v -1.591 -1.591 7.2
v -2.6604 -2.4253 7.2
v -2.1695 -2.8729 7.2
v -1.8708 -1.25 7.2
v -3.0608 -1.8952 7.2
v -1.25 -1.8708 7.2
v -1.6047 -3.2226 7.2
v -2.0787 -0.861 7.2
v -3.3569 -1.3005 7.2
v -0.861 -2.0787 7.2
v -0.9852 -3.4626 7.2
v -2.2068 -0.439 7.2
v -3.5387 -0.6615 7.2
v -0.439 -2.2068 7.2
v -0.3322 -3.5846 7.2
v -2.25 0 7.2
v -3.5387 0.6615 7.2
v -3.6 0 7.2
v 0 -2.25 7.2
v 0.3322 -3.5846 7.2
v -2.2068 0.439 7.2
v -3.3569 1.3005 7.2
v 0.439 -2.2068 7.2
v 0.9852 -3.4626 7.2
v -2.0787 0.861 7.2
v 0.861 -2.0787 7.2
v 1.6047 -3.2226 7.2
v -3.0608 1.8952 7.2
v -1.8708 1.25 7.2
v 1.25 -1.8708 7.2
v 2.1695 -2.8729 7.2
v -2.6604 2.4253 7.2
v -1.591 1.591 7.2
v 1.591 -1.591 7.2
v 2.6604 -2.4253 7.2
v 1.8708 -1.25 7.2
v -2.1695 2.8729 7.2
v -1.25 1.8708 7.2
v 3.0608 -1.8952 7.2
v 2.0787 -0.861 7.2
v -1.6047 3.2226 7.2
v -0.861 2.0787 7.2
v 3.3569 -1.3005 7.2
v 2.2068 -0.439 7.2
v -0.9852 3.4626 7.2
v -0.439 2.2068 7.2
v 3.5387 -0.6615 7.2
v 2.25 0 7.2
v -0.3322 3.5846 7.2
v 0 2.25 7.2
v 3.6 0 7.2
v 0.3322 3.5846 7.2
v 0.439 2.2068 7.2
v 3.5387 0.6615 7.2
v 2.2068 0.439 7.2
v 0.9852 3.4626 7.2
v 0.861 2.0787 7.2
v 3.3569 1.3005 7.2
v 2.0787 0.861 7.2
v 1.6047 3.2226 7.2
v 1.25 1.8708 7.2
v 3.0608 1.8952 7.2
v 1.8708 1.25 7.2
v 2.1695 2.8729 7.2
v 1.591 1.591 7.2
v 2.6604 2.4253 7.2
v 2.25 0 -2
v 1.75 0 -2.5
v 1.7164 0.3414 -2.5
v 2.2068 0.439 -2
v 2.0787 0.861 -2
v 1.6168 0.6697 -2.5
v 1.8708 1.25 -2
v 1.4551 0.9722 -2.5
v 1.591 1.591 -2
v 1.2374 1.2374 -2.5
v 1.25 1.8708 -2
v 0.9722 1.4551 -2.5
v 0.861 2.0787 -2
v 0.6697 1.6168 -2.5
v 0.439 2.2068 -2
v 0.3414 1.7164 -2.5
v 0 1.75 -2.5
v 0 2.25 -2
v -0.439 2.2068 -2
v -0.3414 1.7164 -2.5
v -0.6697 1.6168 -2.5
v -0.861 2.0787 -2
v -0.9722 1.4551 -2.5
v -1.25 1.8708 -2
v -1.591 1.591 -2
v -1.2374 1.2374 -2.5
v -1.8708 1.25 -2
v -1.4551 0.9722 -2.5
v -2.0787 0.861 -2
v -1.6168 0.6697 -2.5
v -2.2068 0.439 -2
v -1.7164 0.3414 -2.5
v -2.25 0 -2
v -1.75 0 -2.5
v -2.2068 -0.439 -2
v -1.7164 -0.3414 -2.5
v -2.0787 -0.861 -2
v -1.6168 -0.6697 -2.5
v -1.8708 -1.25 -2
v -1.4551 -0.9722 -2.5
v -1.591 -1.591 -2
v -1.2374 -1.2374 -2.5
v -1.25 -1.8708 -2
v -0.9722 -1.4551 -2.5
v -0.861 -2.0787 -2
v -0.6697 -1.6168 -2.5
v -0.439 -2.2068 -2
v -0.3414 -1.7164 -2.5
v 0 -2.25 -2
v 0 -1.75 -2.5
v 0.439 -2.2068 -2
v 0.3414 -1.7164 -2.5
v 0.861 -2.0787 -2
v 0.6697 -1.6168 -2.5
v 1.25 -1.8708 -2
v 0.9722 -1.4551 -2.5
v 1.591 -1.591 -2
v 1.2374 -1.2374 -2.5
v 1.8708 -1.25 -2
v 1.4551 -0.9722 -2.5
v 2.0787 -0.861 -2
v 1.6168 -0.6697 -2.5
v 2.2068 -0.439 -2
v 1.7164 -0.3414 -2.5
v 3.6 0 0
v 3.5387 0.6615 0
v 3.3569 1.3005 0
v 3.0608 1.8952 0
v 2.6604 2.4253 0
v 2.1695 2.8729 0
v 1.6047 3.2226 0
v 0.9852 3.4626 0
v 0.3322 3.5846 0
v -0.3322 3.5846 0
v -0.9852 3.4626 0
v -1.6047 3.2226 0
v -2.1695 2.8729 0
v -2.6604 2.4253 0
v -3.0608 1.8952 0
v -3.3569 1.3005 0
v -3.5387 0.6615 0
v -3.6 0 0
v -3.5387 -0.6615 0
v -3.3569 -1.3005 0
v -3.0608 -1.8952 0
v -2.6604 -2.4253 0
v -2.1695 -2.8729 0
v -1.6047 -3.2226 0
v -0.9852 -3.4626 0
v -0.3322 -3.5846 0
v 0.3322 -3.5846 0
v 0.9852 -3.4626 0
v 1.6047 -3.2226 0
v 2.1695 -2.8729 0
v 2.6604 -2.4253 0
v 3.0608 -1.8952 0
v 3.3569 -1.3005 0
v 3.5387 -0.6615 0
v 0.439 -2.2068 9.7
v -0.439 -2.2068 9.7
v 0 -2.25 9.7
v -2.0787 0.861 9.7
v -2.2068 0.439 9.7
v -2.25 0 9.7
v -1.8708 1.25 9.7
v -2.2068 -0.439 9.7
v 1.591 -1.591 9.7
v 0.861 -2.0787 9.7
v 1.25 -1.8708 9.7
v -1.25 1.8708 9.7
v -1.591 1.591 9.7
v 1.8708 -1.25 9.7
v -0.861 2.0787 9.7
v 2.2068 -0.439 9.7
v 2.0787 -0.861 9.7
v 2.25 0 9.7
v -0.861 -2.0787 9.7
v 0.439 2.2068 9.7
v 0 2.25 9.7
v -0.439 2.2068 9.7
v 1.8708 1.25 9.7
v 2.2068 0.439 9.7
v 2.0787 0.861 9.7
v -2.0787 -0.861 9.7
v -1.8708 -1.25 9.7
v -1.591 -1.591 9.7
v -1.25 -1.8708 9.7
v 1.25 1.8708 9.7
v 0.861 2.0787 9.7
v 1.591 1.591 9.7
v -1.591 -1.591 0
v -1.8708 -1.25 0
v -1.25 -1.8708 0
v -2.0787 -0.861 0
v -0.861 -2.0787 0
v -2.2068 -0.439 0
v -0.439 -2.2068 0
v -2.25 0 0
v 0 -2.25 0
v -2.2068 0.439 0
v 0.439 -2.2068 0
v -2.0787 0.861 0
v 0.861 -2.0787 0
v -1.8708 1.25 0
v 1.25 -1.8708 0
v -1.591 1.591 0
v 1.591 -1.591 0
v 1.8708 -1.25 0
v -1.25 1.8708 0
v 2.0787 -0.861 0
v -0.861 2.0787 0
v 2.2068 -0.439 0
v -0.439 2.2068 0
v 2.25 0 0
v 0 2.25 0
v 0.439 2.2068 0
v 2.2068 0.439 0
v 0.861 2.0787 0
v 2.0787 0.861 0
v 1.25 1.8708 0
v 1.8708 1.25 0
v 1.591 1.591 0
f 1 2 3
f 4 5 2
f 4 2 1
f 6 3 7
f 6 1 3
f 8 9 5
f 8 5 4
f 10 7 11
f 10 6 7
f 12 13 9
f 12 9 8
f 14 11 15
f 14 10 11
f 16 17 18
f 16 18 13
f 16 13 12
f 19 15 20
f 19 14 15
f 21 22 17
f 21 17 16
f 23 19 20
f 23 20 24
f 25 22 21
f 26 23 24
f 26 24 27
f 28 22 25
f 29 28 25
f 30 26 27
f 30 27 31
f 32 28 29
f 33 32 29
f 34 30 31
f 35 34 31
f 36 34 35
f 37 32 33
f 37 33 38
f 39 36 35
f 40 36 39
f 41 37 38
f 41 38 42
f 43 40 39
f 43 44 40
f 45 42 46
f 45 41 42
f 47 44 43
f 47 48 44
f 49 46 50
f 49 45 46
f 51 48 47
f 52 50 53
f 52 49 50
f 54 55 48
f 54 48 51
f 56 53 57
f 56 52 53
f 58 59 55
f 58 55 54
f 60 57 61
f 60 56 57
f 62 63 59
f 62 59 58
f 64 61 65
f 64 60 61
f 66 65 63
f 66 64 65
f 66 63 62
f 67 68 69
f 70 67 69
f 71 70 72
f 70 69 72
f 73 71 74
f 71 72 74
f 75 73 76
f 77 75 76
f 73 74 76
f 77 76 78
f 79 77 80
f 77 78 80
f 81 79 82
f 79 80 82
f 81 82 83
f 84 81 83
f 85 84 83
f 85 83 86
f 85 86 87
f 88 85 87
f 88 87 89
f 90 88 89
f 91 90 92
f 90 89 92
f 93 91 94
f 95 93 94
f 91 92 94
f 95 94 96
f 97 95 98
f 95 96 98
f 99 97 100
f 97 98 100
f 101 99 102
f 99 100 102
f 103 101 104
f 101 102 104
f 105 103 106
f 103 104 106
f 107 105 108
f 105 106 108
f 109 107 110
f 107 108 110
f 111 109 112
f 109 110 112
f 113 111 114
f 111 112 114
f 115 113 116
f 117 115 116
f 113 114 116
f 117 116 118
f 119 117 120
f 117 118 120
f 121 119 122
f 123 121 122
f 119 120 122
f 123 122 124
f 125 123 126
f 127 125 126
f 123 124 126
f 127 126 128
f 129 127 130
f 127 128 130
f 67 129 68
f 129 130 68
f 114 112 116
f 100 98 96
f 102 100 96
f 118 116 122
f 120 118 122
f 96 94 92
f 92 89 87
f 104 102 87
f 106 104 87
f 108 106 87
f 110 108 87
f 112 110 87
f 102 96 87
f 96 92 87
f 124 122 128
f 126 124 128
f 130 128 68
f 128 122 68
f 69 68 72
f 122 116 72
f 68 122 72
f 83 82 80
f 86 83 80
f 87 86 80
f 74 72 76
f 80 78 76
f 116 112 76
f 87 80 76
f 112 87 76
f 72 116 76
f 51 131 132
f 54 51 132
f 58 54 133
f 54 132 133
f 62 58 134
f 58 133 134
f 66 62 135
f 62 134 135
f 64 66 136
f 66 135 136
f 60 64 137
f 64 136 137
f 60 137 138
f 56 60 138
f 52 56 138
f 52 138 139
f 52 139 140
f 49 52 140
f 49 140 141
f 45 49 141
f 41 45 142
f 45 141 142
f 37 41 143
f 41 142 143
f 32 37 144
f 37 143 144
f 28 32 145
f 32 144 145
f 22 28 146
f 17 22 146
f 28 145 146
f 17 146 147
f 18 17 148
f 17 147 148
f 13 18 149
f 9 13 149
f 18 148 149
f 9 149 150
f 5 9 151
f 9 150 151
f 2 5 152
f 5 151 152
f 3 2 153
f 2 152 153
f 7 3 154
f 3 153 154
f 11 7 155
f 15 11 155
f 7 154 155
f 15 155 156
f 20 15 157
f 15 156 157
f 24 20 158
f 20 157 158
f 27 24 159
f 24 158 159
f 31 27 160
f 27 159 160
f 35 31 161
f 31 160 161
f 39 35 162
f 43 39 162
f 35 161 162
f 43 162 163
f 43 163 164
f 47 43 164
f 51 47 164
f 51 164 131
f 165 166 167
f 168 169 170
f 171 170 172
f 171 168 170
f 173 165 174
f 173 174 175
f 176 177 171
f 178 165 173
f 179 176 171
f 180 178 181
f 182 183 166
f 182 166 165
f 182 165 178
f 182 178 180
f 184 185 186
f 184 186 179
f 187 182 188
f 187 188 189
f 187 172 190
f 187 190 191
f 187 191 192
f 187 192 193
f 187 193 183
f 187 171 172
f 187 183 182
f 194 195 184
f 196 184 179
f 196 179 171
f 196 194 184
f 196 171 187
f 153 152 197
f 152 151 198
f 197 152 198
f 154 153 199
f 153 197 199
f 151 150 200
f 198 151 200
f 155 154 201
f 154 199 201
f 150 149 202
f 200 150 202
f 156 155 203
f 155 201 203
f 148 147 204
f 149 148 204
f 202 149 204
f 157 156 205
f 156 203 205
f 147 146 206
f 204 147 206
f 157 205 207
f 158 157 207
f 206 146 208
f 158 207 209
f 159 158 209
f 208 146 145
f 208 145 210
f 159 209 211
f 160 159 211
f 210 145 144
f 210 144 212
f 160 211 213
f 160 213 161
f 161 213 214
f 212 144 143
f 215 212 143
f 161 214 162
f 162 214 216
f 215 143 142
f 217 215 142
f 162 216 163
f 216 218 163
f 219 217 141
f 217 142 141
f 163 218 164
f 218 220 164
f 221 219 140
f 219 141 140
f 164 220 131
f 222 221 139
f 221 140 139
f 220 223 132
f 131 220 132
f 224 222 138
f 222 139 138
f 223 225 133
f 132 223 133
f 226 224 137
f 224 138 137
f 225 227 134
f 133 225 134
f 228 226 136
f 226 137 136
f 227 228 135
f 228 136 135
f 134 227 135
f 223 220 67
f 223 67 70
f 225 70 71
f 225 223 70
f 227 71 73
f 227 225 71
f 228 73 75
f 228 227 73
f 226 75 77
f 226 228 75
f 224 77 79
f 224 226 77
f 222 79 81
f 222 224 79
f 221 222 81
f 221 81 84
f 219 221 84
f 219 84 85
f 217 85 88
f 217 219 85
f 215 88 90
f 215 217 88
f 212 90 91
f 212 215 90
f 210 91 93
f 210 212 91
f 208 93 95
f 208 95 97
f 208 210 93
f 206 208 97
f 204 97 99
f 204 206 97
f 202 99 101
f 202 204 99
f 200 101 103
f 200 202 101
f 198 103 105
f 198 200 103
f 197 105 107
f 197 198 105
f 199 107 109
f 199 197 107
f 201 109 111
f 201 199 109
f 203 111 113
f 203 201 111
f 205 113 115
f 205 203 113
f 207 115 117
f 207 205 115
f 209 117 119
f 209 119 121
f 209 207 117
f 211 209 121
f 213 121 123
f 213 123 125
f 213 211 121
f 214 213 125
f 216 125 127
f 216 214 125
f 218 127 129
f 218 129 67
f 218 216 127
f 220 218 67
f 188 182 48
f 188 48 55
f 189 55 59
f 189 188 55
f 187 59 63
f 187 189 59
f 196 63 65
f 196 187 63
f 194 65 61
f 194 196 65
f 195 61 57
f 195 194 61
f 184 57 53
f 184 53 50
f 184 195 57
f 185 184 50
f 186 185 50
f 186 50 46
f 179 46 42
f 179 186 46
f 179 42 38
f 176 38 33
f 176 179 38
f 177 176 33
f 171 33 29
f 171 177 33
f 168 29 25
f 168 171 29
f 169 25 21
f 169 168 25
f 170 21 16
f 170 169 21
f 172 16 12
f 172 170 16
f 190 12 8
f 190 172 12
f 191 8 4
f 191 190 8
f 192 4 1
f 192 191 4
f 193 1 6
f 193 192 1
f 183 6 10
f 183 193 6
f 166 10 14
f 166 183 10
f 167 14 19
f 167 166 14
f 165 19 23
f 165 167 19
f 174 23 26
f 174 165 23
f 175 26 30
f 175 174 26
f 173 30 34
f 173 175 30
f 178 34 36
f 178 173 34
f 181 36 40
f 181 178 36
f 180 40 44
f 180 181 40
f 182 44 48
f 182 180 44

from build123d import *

# Parameters (mm, degrees)
SKETCH3_R           = 3.6
BOSS_EXTRUDE1_DEPTH = 7.2
SKETCH4_R           = 2.25
BOSS_EXTRUDE2_DEPTH = 2.5
BOSS_EXTRUDE3_START = 2.5
SKETCH5_R           = 2.25
BOSS_EXTRUDE3_DEPTH = 2.5
CHAMFER1_SIZE       = 0.5


with BuildPart() as part:
    # Sketch3 → Boss-Extrude1 (new body)
    with BuildSketch(Plane.XY):
        Circle(SKETCH3_R)
    extrude(amount=BOSS_EXTRUDE1_DEPTH)

    # Sketch4 → Boss-Extrude2 (add)
    with BuildSketch(Plane.XY):
        Circle(SKETCH4_R)
    extrude(amount=-BOSS_EXTRUDE2_DEPTH)

    # Sketch5 → Boss-Extrude3 (add)
    with BuildSketch(Plane.XY.offset(7.2).offset(BOSS_EXTRUDE3_START)):
        Circle(SKETCH5_R)
    extrude(amount=-BOSS_EXTRUDE3_DEPTH)

    # Chamfer1
    chamfer1_edges = [part.edges().sort_by_distance(p)[0] for p in [
        (-2.25, 0, -2.5),
    ]]
    chamfer(chamfer1_edges, length=CHAMFER1_SIZE)


solid = part.part
